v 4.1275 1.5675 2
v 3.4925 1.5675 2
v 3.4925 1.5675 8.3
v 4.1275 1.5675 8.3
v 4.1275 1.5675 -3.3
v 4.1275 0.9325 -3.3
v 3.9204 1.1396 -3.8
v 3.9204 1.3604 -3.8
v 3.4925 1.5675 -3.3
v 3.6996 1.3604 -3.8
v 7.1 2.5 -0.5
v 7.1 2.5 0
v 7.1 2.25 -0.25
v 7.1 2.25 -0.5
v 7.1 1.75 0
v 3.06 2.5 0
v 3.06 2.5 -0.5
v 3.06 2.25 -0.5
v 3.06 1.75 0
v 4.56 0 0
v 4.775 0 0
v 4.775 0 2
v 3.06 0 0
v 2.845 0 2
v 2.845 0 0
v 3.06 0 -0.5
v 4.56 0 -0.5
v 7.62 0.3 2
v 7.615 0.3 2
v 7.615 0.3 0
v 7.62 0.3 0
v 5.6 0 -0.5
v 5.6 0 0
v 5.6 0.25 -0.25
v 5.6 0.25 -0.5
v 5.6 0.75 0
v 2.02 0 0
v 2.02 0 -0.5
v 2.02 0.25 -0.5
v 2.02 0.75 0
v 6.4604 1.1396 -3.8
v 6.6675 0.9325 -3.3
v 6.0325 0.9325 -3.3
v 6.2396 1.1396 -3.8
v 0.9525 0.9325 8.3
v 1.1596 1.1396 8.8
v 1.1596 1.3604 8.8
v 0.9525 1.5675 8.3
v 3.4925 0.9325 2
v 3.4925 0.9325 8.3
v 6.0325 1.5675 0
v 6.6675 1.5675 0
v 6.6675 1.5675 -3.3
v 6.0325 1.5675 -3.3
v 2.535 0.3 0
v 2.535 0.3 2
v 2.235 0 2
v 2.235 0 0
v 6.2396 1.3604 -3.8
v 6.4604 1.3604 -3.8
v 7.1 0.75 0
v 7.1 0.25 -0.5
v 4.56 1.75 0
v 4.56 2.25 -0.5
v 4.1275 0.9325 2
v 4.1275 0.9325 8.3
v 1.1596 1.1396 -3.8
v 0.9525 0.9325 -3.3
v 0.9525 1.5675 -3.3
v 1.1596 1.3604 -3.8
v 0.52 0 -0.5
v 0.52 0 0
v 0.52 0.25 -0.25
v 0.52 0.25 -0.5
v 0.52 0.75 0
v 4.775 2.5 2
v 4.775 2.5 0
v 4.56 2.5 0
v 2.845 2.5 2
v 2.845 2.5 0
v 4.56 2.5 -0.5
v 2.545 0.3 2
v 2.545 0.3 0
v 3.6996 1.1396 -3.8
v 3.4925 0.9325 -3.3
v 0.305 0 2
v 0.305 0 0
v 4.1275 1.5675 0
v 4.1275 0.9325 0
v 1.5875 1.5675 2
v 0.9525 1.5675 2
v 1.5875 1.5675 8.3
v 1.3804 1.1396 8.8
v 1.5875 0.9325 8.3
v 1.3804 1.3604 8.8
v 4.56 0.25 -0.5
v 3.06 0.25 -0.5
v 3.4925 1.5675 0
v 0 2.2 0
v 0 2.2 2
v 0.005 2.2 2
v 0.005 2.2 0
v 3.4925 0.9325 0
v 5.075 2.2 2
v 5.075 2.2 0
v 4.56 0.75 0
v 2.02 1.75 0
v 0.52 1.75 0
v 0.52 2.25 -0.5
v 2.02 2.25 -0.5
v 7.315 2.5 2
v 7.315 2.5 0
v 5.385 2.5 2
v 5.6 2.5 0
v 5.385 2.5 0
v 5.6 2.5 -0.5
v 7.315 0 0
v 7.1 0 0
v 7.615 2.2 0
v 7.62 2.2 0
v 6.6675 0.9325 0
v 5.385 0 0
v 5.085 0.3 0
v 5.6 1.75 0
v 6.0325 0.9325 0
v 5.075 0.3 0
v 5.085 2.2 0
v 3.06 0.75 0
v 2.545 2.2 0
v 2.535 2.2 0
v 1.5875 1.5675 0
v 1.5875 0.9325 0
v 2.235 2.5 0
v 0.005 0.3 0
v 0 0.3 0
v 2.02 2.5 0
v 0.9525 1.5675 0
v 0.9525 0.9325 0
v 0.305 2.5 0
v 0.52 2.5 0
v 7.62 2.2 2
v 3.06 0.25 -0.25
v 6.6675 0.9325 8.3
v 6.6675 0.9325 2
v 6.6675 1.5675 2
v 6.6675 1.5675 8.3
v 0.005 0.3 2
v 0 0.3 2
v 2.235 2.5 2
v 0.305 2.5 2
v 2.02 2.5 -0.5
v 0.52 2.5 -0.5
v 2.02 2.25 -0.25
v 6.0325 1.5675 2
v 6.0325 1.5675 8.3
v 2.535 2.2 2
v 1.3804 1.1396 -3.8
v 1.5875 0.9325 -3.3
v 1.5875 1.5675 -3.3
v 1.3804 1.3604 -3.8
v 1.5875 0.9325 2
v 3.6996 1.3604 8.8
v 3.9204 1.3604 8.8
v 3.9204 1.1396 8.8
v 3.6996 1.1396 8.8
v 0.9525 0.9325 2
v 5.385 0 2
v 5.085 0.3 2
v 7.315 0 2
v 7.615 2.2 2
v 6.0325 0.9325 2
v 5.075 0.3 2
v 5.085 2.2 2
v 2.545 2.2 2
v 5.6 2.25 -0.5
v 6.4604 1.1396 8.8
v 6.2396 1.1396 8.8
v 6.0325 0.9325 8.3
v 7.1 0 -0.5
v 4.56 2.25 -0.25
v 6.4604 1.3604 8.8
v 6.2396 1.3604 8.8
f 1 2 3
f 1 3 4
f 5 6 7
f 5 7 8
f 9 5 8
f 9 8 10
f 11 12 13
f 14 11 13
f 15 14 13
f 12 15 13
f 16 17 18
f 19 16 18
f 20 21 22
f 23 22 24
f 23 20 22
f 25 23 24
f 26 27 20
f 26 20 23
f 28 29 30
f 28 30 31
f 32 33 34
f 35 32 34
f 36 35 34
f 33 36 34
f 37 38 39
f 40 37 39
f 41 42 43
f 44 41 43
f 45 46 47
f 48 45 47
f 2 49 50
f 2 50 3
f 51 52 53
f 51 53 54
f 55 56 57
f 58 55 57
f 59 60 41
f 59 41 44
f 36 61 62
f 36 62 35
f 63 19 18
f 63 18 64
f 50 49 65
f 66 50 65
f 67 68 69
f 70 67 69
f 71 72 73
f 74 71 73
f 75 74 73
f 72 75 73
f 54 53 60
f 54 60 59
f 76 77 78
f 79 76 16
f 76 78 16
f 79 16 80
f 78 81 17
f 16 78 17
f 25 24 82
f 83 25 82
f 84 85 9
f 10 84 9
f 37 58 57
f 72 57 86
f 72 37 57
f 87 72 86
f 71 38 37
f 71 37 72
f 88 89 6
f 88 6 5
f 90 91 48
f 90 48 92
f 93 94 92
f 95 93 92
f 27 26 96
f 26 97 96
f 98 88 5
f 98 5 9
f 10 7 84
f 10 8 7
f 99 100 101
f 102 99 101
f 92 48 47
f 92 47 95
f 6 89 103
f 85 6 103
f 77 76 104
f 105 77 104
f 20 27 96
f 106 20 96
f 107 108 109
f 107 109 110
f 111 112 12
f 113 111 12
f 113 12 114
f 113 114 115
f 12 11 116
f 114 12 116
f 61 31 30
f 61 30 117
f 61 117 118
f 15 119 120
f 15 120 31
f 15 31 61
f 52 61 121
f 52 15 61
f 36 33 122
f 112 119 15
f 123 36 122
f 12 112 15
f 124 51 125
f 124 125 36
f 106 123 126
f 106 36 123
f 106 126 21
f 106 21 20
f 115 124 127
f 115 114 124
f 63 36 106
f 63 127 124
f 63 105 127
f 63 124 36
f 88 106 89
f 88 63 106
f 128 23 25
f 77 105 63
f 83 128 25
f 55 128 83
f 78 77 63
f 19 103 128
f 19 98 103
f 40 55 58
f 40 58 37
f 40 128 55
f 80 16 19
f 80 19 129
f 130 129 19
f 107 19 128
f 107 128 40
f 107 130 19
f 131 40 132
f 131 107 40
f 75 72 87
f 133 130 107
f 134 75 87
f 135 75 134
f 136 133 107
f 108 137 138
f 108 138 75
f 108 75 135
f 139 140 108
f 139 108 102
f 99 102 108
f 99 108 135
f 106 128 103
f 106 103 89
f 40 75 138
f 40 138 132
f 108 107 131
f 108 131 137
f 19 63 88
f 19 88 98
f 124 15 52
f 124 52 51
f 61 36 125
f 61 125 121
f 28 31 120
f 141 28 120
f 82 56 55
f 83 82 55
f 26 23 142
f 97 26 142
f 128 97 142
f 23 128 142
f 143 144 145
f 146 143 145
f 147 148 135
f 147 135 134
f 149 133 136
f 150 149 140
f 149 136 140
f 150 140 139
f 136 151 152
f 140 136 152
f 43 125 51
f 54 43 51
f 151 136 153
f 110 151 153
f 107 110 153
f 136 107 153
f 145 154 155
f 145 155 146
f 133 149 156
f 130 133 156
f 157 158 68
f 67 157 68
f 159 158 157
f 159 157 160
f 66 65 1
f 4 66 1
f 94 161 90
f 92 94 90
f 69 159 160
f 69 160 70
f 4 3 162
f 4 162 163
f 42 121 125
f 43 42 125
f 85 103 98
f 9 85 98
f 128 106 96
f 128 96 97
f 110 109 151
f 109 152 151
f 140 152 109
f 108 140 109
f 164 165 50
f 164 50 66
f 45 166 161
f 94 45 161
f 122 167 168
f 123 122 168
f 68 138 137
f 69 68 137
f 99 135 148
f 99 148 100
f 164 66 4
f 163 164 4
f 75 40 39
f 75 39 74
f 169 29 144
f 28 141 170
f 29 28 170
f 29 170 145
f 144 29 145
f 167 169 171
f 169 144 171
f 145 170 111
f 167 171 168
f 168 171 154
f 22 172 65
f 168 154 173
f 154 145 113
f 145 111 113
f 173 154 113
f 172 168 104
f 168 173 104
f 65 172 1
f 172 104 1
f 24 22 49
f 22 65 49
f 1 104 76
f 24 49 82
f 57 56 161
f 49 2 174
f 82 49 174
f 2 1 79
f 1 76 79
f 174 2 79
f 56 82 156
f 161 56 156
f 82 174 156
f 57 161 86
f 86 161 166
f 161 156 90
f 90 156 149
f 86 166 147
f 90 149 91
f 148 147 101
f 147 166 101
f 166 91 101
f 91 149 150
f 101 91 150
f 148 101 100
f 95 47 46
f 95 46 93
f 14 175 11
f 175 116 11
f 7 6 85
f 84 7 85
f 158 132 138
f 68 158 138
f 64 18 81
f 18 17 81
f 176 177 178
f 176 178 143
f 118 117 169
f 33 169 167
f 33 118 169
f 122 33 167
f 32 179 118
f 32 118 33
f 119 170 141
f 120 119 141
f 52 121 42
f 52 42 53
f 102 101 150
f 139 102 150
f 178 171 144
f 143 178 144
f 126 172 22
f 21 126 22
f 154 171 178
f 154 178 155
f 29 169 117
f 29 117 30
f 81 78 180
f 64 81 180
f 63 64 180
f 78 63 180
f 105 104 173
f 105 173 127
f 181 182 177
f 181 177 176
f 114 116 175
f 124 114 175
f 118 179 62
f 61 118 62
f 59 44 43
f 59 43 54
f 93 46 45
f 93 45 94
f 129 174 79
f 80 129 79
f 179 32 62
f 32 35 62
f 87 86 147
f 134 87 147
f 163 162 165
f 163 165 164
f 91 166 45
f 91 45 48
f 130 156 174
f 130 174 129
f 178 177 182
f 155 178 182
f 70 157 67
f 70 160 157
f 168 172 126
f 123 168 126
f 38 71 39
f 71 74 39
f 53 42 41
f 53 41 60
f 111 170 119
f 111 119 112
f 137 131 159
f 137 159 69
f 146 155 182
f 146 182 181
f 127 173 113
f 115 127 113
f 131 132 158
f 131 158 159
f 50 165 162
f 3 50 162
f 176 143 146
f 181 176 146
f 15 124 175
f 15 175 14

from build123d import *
from OCP.BRepFilletAPI import BRepFilletAPI_MakeChamfer

# Parameters (mm, degrees)
SKETCH1_W            = 7.62
SKETCH1_H            = 2.5
BOSS_EXTRUDE1_DEPTH  = 2
CUT_EXTRUDE1_DEPTH   = 9.265252567
SKETCH3_W            = 0.305
SKETCH3_H            = 0.3
CUT_EXTRUDE2_DEPTH   = 2
SKETCH4_W            = 0.305
SKETCH4_H            = 0.3
CUT_EXTRUDE3_DEPTH   = 9.265252567
CUT_EXTRUDE4_DEPTH   = 9.265252567
CUT_EXTRUDE5_DEPTH   = 9.265252567
SKETCH7_W            = 0.305
SKETCH7_H            = 0.3
CUT_EXTRUDE6_DEPTH   = 2
SKETCH8_W            = 0.305
SKETCH8_H            = 0.3
CUT_EXTRUDE7_DEPTH   = 9.265252567
CUT_EXTRUDE8_DEPTH   = 9.265252567
SKETCH10_W           = 0.635
SKETCH10_H           = 0.635
BOSS_EXTRUDE2_DEPTH  = 3.8
SKETCH11_W           = 0.635
SKETCH11_H           = 0.635
BOSS_EXTRUDE3_DEPTH  = 3.8
BOSS_EXTRUDE4_DEPTH  = 0.5
BOSS_EXTRUDE5_DEPTH  = 0.5
BOSS_EXTRUDE6_DEPTH  = 0.5
BOSS_EXTRUDE7_DEPTH  = 0.5
BOSS_EXTRUDE8_DEPTH  = 0.5
BOSS_EXTRUDE9_DEPTH  = 0.5
SKETCH18_W           = 0.635
SKETCH18_H           = 0.635
BOSS_EXTRUDE10_DEPTH = 3.8
SKETCH19_W           = 0.635
SKETCH19_H           = 0.635
BOSS_EXTRUDE11_DEPTH = 6.8
SKETCH20_W           = 0.635
SKETCH20_H           = 0.635
BOSS_EXTRUDE12_DEPTH = 6.8
SKETCH21_W           = 0.635
SKETCH21_H           = 0.635
BOSS_EXTRUDE13_DEPTH = 6.8
DRAFT1_ANGLE         = 45
DRAFT2_ANGLE         = 45
DRAFT3_ANGLE         = 45
DRAFT4_ANGLE         = 45
DRAFT5_ANGLE         = 45
CHAMFER1_SIZE        = 0.007071068
CHAMFER2_SIZE        = 0.207106781
CHAMFER2_SIZE2       = 0.5


with BuildPart() as part:
    # Sketch1 → Boss-Extrude1 (new body)
    with BuildSketch(Plane(origin=(0, 0, 0), x_dir=(-1, 0, 0), z_dir=(0, 0, -1))):
        with Locations((-3.81, 1.25)):
            Rectangle(SKETCH1_W, SKETCH1_H)
    extrude(amount=-BOSS_EXTRUDE1_DEPTH)

    # Sketch2 → Cut-Extrude1 (cut, through all)
    with BuildSketch(Plane.XY.offset(2)):
        Polygon((4.775, 2.5), (5.385, 1.89), (5.385, 2.5), align=None)
    extrude(amount=-CUT_EXTRUDE1_DEPTH, mode=Mode.SUBTRACT)

    # Sketch3 → Cut-Extrude2 (cut)
    with BuildSketch(Plane.XY.offset(2)):
        with Locations((7.4675, 2.35)):
            Rectangle(SKETCH3_W, SKETCH3_H)
    extrude(amount=-CUT_EXTRUDE2_DEPTH, mode=Mode.SUBTRACT)

    # Sketch4 → Cut-Extrude3 (cut, through all)
    with BuildSketch(Plane.XY.offset(2)):
        with Locations((7.4675, 0.15)):
            Rectangle(SKETCH4_W, SKETCH4_H)
    extrude(amount=-CUT_EXTRUDE3_DEPTH, mode=Mode.SUBTRACT)

    # Sketch5 → Cut-Extrude4 (cut, through all)
    with BuildSketch(Plane.XY.offset(2)):
        Polygon((5.385, 0), (5.385, 0.61), (4.775, 0), align=None)
    extrude(amount=-CUT_EXTRUDE4_DEPTH, mode=Mode.SUBTRACT)

    # Sketch6 → Cut-Extrude5 (cut, through all)
    with BuildSketch(Plane.XY.offset(2)):
        Polygon((2.845, 0), (2.235, 0.61), (2.235, 0), align=None)
    extrude(amount=-CUT_EXTRUDE5_DEPTH, mode=Mode.SUBTRACT)

    # Sketch7 → Cut-Extrude6 (cut)
    with BuildSketch(Plane.XY.offset(2)):
        with Locations((0.1525, 0.15)):
            Rectangle(SKETCH7_W, SKETCH7_H)
    extrude(amount=-CUT_EXTRUDE6_DEPTH, mode=Mode.SUBTRACT)

    # Sketch8 → Cut-Extrude7 (cut, through all)
    with BuildSketch(Plane.XY.offset(2)):
        with Locations((0.1525, 2.35)):
            Rectangle(SKETCH8_W, SKETCH8_H)
    extrude(amount=-CUT_EXTRUDE7_DEPTH, mode=Mode.SUBTRACT)

    # Sketch9 → Cut-Extrude8 (cut, through all)
    with BuildSketch(Plane.XY.offset(2)):
        Polygon((2.235, 2.5), (2.235, 1.89), (2.845, 2.5), align=None)
    extrude(amount=-CUT_EXTRUDE8_DEPTH, mode=Mode.SUBTRACT)

    # Sketch10 → Boss-Extrude2 (add)
    with BuildSketch(Plane(origin=(0, 0, 0), x_dir=(-1, 0, 0), z_dir=(0, 0, -1))):
        with Locations((-6.35, 1.25)):
            Rectangle(SKETCH10_W, SKETCH10_H)
    extrude(amount=BOSS_EXTRUDE2_DEPTH)

    # Sketch11 → Boss-Extrude3 (add)
    with BuildSketch(Plane(origin=(0, 0, 0), x_dir=(-1, 0, 0), z_dir=(0, 0, -1))):
        with Locations((-3.81, 1.25)):
            Rectangle(SKETCH11_W, SKETCH11_H)
    extrude(amount=BOSS_EXTRUDE3_DEPTH)

    # Sketch12 → Boss-Extrude4 (add)
    with BuildSketch(Plane(origin=(0, 0, 0), x_dir=(-1, 0, 0), z_dir=(0, 0, -1))):
        with BuildLine():
            Line((-5.6, 0), (-7.1, 0))
            Line((-7.1, 0), (-7.1, 0.75))
            Line((-7.1, 0.75), (-5.6, 0.75))
            add(Edge.make_bspline(
                [(-5.6, 0), (-5.6, 0.25), (-5.6, 0.75)],
                knots=[0, 0, 1, 3, 3], degree=1))
        make_face()
    extrude(amount=BOSS_EXTRUDE4_DEPTH)

    # Sketch13 → Boss-Extrude5 (add)
    with BuildSketch(Plane(origin=(0, 0, 0), x_dir=(-1, 0, 0), z_dir=(0, 0, -1))):
        with BuildLine():
            Line((-3.06, 0), (-4.56, 0))
            Line((-4.56, 0), (-4.56, 0.75))
            Line((-4.56, 0.75), (-3.06, 0.75))
            add(Edge.make_bspline(
                [(-3.06, 0), (-3.06, 0.25), (-3.06, 0.75)],
                knots=[0, 0, 1, 3, 3], degree=1))
        make_face()
    extrude(amount=BOSS_EXTRUDE5_DEPTH)

    # Sketch14 → Boss-Extrude6 (add)
    with BuildSketch(Plane(origin=(0, 0, 0), x_dir=(-1, 0, 0), z_dir=(0, 0, -1))):
        with BuildLine():
            Line((-0.52, 0), (-2.02, 0))
            Line((-2.02, 0), (-2.02, 0.75))
            Line((-2.02, 0.75), (-0.52, 0.75))
            add(Edge.make_bspline(
                [(-0.52, 0), (-0.52, 0.25), (-0.52, 0.75)],
                knots=[0, 0, 1, 3, 3], degree=1))
        make_face()
    extrude(amount=BOSS_EXTRUDE6_DEPTH)

    # Sketch15 → Boss-Extrude7 (add)
    with BuildSketch(Plane(origin=(0, 0, 0), x_dir=(-1, 0, 0), z_dir=(0, 0, -1))):
        with BuildLine():
            Line((-5.6, 1.75), (-7.1, 1.75))
            add(Edge.make_bspline(
                [(-7.1, 2.5), (-7.1, 2.25), (-7.1, 1.75)],
                knots=[-2.2, -2.2, -1.2, 0.8, 0.8], degree=1))
            Line((-7.1, 2.5), (-5.6, 2.5))
            Line((-5.6, 2.5), (-5.6, 1.75))
        make_face()
    extrude(amount=BOSS_EXTRUDE7_DEPTH)

    # Sketch16 → Boss-Extrude8 (add)
    with BuildSketch(Plane(origin=(0, 0, 0), x_dir=(-1, 0, 0), z_dir=(0, 0, -1))):
        with BuildLine():
            Line((-3.06, 1.75), (-4.56, 1.75))
            add(Edge.make_bspline(
                [(-4.56, 2.5), (-4.56, 2.25), (-4.56, 1.75)],
                knots=[-2.2, -2.2, -1.2, 0.8, 0.8], degree=1))
            Line((-4.56, 2.5), (-3.06, 2.5))
            Line((-3.06, 2.5), (-3.06, 1.75))
        make_face()
    extrude(amount=BOSS_EXTRUDE8_DEPTH)

    # Sketch17 → Boss-Extrude9 (add)
    with BuildSketch(Plane(origin=(0, 0, 0), x_dir=(-1, 0, 0), z_dir=(0, 0, -1))):
        with BuildLine():
            Line((-0.52, 1.75), (-2.02, 1.75))
            add(Edge.make_bspline(
                [(-2.02, 2.5), (-2.02, 2.25), (-2.02, 1.75)],
                knots=[-2.2, -2.2, -1.2, 0.8, 0.8], degree=1))
            Line((-2.02, 2.5), (-0.52, 2.5))
            Line((-0.52, 2.5), (-0.52, 1.75))
        make_face()
    extrude(amount=BOSS_EXTRUDE9_DEPTH)

    # Sketch18 → Boss-Extrude10 (add)
    with BuildSketch(Plane(origin=(0, 0, 0), x_dir=(-1, 0, 0), z_dir=(0, 0, -1))):
        with Locations((-1.27, 1.25)):
            Rectangle(SKETCH18_W, SKETCH18_H)
    extrude(amount=BOSS_EXTRUDE10_DEPTH)

    # Sketch19 → Boss-Extrude11 (add)
    with BuildSketch(Plane.XY.offset(2)):
        with Locations((6.35, 1.25)):
            Rectangle(SKETCH19_W, SKETCH19_H)
    extrude(amount=BOSS_EXTRUDE11_DEPTH)

    # Sketch20 → Boss-Extrude12 (add)
    with BuildSketch(Plane.XY.offset(2)):
        with Locations((3.81, 1.25)):
            Rectangle(SKETCH20_W, SKETCH20_H)
    extrude(amount=BOSS_EXTRUDE12_DEPTH)

    # Sketch21 → Boss-Extrude13 (add)
    with BuildSketch(Plane.XY.offset(2)):
        with Locations((1.27, 1.25)):
            Rectangle(SKETCH21_W, SKETCH21_H)
    extrude(amount=BOSS_EXTRUDE13_DEPTH)

    # Draft1
    draft1_faces = [part.faces().sort_by_distance(p)[0] for p in [
        (2.235, 2.195, 1),
        (0.305, 2.35, 1),
    ]]
    draft(draft1_faces, Plane(origin=(0, 2.5, 2), x_dir=(0, 0, 1), z_dir=(0, 1, 0)), DRAFT1_ANGLE)

    # Draft2
    draft2_faces = [part.faces().sort_by_distance(p)[0] for p in [
        (7.315, 2.35, 1),
        (5.385, 2.195, 1),
    ]]
    draft(draft2_faces, Plane(origin=(0, 2.5, 2), x_dir=(0, 0, 1), z_dir=(0, 1, 0)), DRAFT2_ANGLE)

    # Draft3
    draft3_faces = [part.faces().sort_by_distance(p)[0] for p in [
        (5.385, 0.305, 1),
        (7.315, 0.15, 1),
    ]]
    draft(draft3_faces, Plane(origin=(7.62, 0, 2), x_dir=(0, 0, -1), z_dir=(0, -1, 0)), DRAFT3_ANGLE)

    # Draft4
    draft4_faces = [part.faces().sort_by_distance(p)[0] for p in [
        (0.305, 0.15, 1),
        (2.235, 0.305, 1),
    ]]
    draft(draft4_faces, Plane(origin=(7.62, 0, 2), x_dir=(0, 0, -1), z_dir=(0, -1, 0)), DRAFT4_ANGLE)

    # Draft5
    draft5_faces = [part.faces().sort_by_distance(p)[0] for p in [
        (1.27, 0.75, -0.25),
        (3.81, 0.75, -0.25),
        (6.35, 0.75, -0.25),
        (6.35, 1.75, -0.25),
        (3.81, 1.75, -0.25),
        (1.27, 1.75, -0.25),
    ]]
    draft(draft5_faces, Plane(origin=(0, 0, 0), x_dir=(-1, 0, 0), z_dir=(0, 0, -1)), DRAFT5_ANGLE)

    # Chamfer1
    chamfer1_edges = [part.edges().sort_by_distance(p)[0] for p in [
        (2.54, 2.195, 1),
        (5.08, 2.195, 1),
        (5.08, 0.305, 1),
        (2.54, 0.305, 1),
    ]]
    chamfer(chamfer1_edges, length=CHAMFER1_SIZE)

    # Chamfer2: one chamfer whose edges measure the first distance from different faces: ONE call of the kernel's chamfer builder (chamfer() names one face for all edges)
    chamfer2_edges_1 = [part.edges().sort_by_distance(p)[0] for p in [
        (6.6675, 1.25, -3.8),
        (6.35, 0.9325, -3.8),
        (6.0325, 1.25, -3.8),
        (6.35, 1.5675, -3.8),
    ]]
    chamfer2_side_1 = [part.faces().sort_by_distance(p)[0] for p in [
        (6.35, 1.25, -3.8),
    ]]
    chamfer2_edges_2 = [part.edges().sort_by_distance(p)[0] for p in [
        (3.81, 0.9325, -3.8),
        (3.4925, 1.25, -3.8),
        (3.81, 1.5675, -3.8),
        (4.1275, 1.25, -3.8),
    ]]
    chamfer2_side_2 = [part.faces().sort_by_distance(p)[0] for p in [
        (3.81, 1.25, -3.8),
    ]]
    chamfer2_edges_3 = [part.edges().sort_by_distance(p)[0] for p in [
        (1.27, 0.9325, -3.8),
        (0.9525, 1.25, -3.8),
        (1.27, 1.5675, -3.8),
        (1.5875, 1.25, -3.8),
    ]]
    chamfer2_side_3 = [part.faces().sort_by_distance(p)[0] for p in [
        (1.27, 1.25, -3.8),
    ]]
    chamfer2_edges_4 = [part.edges().sort_by_distance(p)[0] for p in [
        (6.0325, 1.25, 8.8),
        (6.35, 0.9325, 8.8),
        (6.6675, 1.25, 8.8),
        (6.35, 1.5675, 8.8),
    ]]
    chamfer2_side_4 = [part.faces().sort_by_distance(p)[0] for p in [
        (6.35, 1.25, 8.8),
    ]]
    chamfer2_edges_5 = [part.edges().sort_by_distance(p)[0] for p in [
        (3.4925, 1.25, 8.8),
        (3.81, 0.9325, 8.8),
        (4.1275, 1.25, 8.8),
        (3.81, 1.5675, 8.8),
    ]]
    chamfer2_side_5 = [part.faces().sort_by_distance(p)[0] for p in [
        (3.81, 1.25, 8.8),
    ]]
    chamfer2_edges_6 = [part.edges().sort_by_distance(p)[0] for p in [
        (0.9525, 1.25, 8.8),
        (1.27, 0.9325, 8.8),
        (1.5875, 1.25, 8.8),
        (1.27, 1.5675, 8.8),
    ]]
    chamfer2_side_6 = [part.faces().sort_by_distance(p)[0] for p in [
        (1.27, 1.25, 8.8),
    ]]
    chamfer2 = BRepFilletAPI_MakeChamfer(part.part.solid().wrapped)
    for e in chamfer2_edges_1:
        chamfer2.Add(CHAMFER2_SIZE, CHAMFER2_SIZE2, e.wrapped, chamfer2_side_1[0].wrapped)  # the first distance lies on this face
    for e in chamfer2_edges_2:
        chamfer2.Add(CHAMFER2_SIZE, CHAMFER2_SIZE2, e.wrapped, chamfer2_side_2[0].wrapped)  # the first distance lies on this face
    for e in chamfer2_edges_3:
        chamfer2.Add(CHAMFER2_SIZE, CHAMFER2_SIZE2, e.wrapped, chamfer2_side_3[0].wrapped)  # the first distance lies on this face
    for e in chamfer2_edges_4:
        chamfer2.Add(CHAMFER2_SIZE, CHAMFER2_SIZE2, e.wrapped, chamfer2_side_4[0].wrapped)  # the first distance lies on this face
    for e in chamfer2_edges_5:
        chamfer2.Add(CHAMFER2_SIZE, CHAMFER2_SIZE2, e.wrapped, chamfer2_side_5[0].wrapped)  # the first distance lies on this face
    for e in chamfer2_edges_6:
        chamfer2.Add(CHAMFER2_SIZE, CHAMFER2_SIZE2, e.wrapped, chamfer2_side_6[0].wrapped)  # the first distance lies on this face
    add(Compound.cast(chamfer2.Shape()), mode=Mode.REPLACE)


solid = part.part
